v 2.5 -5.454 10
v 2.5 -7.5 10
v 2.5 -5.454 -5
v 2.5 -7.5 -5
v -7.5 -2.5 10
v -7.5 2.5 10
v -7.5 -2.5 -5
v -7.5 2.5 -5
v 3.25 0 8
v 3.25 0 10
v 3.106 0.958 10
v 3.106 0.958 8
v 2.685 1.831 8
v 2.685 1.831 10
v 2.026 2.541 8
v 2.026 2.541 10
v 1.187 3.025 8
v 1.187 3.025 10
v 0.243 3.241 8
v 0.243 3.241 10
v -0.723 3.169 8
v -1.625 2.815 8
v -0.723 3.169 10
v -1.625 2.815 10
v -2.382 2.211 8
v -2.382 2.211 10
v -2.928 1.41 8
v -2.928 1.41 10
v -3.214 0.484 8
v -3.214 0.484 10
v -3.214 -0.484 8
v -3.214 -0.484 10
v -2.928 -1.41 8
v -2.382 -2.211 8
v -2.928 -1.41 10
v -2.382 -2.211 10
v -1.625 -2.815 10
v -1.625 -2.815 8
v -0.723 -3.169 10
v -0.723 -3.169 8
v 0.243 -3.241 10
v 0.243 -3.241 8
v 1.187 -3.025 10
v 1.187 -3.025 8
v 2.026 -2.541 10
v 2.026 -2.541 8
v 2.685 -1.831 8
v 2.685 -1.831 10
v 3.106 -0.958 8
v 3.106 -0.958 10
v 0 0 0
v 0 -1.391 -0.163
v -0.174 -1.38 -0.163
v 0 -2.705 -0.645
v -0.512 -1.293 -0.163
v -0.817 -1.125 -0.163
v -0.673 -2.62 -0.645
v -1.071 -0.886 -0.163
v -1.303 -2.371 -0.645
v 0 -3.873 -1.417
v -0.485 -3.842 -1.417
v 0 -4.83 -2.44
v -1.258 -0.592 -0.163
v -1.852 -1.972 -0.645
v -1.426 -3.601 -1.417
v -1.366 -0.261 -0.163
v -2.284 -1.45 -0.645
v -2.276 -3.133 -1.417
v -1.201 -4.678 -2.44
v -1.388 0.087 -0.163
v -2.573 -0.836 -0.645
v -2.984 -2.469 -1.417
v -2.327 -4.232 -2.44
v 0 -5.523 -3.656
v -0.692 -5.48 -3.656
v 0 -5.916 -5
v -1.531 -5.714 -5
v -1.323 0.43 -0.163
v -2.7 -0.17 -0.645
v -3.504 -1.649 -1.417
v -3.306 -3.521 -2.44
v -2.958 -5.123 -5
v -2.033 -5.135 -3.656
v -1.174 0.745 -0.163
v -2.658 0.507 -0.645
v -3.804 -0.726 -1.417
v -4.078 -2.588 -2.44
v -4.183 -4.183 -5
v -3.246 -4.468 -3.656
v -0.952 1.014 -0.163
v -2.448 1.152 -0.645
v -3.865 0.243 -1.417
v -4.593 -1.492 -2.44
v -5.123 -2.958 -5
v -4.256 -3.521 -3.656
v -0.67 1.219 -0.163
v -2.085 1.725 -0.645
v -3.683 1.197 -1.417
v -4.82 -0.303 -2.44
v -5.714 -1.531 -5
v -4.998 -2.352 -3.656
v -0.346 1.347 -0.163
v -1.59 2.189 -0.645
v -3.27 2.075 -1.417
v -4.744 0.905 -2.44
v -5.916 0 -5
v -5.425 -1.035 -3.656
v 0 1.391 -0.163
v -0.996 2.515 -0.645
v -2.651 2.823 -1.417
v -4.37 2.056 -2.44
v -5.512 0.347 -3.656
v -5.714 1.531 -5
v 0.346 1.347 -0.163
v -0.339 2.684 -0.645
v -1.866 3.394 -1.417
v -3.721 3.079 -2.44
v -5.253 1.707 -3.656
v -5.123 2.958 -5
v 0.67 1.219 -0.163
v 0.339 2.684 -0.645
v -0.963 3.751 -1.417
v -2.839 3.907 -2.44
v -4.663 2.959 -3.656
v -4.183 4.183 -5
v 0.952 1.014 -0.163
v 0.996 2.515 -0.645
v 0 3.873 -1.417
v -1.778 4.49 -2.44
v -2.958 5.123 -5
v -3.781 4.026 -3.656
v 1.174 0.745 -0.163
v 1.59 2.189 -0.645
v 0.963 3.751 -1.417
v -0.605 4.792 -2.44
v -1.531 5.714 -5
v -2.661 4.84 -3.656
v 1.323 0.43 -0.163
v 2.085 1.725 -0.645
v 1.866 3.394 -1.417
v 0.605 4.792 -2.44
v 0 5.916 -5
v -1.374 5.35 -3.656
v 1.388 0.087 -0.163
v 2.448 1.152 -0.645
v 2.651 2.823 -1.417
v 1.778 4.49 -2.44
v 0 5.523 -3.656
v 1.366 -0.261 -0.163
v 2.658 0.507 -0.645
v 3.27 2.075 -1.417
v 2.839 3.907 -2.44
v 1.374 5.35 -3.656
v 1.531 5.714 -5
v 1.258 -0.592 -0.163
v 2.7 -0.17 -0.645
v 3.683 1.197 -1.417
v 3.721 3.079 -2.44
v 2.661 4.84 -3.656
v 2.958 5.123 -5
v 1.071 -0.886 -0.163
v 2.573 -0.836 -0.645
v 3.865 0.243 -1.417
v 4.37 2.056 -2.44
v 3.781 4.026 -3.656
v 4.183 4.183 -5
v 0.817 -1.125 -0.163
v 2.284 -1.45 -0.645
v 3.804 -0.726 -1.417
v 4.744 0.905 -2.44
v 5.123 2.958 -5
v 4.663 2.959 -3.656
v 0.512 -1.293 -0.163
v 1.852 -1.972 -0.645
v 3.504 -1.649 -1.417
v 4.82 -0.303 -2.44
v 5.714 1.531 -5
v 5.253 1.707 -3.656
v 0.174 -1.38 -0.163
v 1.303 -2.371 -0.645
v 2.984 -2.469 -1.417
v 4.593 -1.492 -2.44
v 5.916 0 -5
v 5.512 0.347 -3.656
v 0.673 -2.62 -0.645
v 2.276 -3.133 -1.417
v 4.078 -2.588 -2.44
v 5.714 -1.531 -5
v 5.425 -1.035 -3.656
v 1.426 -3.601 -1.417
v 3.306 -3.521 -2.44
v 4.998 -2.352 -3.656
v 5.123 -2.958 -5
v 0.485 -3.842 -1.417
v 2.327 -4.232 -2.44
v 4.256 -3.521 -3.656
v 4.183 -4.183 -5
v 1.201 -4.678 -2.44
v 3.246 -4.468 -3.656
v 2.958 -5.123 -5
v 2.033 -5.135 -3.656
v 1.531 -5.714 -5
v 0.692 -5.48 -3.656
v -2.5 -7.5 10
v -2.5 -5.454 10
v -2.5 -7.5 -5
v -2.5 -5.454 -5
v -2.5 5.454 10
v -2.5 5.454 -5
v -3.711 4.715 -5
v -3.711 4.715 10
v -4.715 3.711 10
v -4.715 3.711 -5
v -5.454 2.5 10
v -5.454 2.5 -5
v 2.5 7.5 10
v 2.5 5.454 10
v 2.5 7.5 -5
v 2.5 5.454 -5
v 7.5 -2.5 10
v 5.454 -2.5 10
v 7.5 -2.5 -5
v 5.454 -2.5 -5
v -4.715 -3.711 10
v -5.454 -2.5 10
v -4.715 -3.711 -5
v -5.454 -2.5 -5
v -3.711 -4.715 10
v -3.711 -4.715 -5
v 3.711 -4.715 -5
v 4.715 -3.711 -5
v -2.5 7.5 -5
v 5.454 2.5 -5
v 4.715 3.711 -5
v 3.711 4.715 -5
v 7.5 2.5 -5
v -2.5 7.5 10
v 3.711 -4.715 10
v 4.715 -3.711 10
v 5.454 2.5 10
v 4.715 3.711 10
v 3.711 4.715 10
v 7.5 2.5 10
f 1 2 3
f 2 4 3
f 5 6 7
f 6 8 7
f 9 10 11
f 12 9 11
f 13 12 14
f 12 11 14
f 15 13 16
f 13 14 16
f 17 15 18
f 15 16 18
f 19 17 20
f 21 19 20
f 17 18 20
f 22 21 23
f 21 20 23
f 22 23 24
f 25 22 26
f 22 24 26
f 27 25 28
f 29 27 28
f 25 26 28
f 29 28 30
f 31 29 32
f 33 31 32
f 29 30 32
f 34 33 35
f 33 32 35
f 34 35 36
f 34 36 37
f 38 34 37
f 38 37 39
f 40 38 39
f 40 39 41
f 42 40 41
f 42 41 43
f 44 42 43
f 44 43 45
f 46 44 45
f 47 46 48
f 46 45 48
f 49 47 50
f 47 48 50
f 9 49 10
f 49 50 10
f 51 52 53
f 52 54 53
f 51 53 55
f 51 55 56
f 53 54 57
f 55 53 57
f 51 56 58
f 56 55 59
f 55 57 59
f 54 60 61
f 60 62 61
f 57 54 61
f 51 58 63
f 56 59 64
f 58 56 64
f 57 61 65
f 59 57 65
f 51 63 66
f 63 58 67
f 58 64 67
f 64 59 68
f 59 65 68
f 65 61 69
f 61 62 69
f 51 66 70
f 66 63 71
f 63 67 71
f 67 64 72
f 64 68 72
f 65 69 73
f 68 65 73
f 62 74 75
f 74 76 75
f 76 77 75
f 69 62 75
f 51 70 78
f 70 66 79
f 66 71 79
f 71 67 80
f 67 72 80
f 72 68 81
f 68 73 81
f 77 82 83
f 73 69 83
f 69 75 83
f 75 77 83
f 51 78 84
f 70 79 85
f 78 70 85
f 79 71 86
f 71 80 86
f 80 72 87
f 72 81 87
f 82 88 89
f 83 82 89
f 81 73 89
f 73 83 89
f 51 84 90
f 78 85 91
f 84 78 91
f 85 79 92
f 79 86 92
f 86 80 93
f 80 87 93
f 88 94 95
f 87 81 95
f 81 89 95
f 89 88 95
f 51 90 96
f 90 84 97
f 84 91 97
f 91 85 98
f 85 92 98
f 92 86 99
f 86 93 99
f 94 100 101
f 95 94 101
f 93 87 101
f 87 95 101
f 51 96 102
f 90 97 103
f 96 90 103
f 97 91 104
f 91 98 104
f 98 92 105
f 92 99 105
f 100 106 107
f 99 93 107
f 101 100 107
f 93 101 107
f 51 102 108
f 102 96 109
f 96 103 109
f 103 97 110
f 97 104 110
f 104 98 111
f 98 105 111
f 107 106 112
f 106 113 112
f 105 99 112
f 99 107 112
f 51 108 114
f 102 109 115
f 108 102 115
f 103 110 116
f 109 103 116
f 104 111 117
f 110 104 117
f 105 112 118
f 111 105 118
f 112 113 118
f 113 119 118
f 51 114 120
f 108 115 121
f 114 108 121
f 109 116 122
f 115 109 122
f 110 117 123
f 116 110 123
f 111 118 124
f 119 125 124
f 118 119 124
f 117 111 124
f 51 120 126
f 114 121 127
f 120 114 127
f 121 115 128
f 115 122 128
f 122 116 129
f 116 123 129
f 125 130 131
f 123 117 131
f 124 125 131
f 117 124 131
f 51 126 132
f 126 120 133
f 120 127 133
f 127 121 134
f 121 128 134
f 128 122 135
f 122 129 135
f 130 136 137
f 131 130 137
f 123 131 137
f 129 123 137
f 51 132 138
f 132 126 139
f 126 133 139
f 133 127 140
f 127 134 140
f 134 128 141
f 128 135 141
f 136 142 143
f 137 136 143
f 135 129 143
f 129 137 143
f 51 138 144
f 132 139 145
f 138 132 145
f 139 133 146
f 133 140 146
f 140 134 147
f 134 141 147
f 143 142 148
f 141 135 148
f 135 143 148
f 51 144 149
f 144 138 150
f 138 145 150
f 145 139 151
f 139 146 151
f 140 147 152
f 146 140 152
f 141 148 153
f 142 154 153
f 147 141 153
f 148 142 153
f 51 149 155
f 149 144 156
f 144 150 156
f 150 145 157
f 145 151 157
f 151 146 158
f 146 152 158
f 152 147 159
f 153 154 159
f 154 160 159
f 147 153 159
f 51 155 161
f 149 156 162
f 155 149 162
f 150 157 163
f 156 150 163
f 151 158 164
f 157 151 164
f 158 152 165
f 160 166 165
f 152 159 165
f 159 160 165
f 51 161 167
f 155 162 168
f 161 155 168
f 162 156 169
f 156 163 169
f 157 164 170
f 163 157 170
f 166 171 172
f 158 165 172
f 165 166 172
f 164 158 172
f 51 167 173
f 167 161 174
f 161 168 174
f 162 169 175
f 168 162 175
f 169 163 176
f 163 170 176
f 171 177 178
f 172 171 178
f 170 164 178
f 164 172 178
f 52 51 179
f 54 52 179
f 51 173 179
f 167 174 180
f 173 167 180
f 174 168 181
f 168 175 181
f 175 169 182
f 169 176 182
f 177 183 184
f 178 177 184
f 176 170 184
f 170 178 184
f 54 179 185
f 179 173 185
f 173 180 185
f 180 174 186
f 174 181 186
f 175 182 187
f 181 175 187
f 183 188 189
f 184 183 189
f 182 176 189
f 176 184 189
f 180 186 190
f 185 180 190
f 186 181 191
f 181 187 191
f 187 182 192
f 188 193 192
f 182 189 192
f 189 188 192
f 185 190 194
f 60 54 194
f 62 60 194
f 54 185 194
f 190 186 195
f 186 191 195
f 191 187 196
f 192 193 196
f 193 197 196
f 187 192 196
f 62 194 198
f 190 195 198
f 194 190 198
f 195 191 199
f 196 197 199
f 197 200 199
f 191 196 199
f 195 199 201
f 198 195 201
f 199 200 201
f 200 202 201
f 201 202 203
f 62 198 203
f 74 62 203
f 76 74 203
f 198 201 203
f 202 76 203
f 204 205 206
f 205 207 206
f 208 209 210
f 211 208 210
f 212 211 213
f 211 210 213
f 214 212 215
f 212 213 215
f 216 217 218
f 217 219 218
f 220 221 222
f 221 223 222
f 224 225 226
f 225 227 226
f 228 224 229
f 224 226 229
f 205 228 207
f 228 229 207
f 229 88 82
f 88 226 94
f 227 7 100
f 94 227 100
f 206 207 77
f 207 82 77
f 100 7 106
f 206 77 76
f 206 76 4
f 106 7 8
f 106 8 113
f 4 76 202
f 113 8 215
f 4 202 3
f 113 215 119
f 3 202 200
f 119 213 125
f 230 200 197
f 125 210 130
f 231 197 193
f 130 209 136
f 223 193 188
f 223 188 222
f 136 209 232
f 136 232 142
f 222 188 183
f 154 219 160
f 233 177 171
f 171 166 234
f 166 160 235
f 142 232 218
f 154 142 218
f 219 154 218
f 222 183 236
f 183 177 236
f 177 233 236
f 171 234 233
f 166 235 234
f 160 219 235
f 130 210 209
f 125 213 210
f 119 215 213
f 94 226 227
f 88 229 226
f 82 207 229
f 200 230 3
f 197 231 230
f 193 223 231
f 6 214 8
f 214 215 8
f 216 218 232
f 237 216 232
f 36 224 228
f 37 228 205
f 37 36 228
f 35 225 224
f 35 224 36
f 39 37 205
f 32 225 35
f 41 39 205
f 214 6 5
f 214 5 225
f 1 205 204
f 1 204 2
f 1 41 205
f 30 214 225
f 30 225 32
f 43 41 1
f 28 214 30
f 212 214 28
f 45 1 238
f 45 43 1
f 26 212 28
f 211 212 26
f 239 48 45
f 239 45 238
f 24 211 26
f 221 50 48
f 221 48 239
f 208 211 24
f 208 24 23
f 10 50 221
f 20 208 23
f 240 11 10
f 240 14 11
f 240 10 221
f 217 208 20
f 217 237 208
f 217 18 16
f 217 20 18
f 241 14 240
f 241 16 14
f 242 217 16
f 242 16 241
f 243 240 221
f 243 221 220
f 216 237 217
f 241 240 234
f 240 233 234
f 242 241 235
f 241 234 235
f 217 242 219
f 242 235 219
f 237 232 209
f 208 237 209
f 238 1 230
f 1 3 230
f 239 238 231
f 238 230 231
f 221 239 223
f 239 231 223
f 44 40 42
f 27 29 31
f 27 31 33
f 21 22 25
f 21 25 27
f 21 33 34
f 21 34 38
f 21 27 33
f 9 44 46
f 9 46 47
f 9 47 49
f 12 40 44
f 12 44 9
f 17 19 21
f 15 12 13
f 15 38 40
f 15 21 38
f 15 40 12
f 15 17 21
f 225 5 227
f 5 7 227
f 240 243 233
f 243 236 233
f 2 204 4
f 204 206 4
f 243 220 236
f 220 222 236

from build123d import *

# Parameters (mm, degrees)
F0_W     = 5
F0_H     = 5
F1_DEPTH = 3
F5_DEPTH = 5
F7_DEPTH = 7
F8_R     = 3.25
F9_DEPTH = 2


with BuildPart() as f1:
    # F0 (on Top) → F1 (new body)
    with BuildSketch(Plane.XY):
        with BuildLine():
            Line((2.5, 2.5), (5.4543560573, 2.5))
            ThreePointArc((5.4543560573, 2.5), (4.2426406871, 4.2426406871), (2.5, 5.4543560573))
            Line((2.5, 5.4543560573), (2.5, 2.5))
        make_face()
        with BuildLine():
            Line((2.5, -7.5), (2.5, -5.4543560573))
            ThreePointArc((2.5, -5.4543560573), (0, -6), (-2.5, -5.4543560573))
            Line((-2.5, -5.4543560573), (-2.5, -7.5))
            Line((-2.5, -7.5), (2.5, -7.5))
        make_face()
        with BuildLine():
            ThreePointArc((-5.4543560573, -2.5), (-4.2426406871, -4.2426406871), (-2.5, -5.4543560573))
            Line((-2.5, -5.4543560573), (-2.5, -2.5))
            Line((-2.5, -2.5), (-5.4543560573, -2.5))
        make_face()
        with BuildLine():
            ThreePointArc((-5.4543560573, -2.5), (-6, 0), (-5.4543560573, 2.5))
            Line((-5.4543560573, 2.5), (-7.5, 2.5))
            Line((-7.5, 2.5), (-7.5, -2.5))
            Line((-7.5, -2.5), (-5.4543560573, -2.5))
        make_face()
        with BuildLine():
            ThreePointArc((2.5, -5.4543560573), (4.2426406871, -4.2426406871), (5.4543560573, -2.5))
            Line((5.4543560573, -2.5), (2.5, -2.5))
            Line((2.5, -2.5), (2.5, -5.4543560573))
        make_face()
        with BuildLine():
            Line((-2.5, 2.5), (-2.5, 5.4543560573))
            ThreePointArc((-2.5, 5.4543560573), (-4.2426406871, 4.2426406871), (-5.4543560573, 2.5))
            Line((-5.4543560573, 2.5), (-2.5, 2.5))
        make_face()
        with BuildLine():
            ThreePointArc((5.4543560573, -2.5), (5.8620020617, -1.2794263668), (6, 0))
            ThreePointArc((6, 0), (5.8620020617, 1.2794263668), (5.4543560573, 2.5))
            Line((5.4543560573, 2.5), (2.5, 2.5))
            Line((2.5, 2.5), (2.5, -2.5))
            Line((2.5, -2.5), (5.4543560573, -2.5))
        make_face()
        Rectangle(F0_W, F0_H)
        with BuildLine():
            Line((-2.5, -2.5), (-2.5, 2.5))
            Line((-2.5, 2.5), (-5.4543560573, 2.5))
            ThreePointArc((-5.4543560573, 2.5), (-6, 0), (-5.4543560573, -2.5))
            Line((-5.4543560573, -2.5), (-2.5, -2.5))
        make_face()
        with BuildLine():
            Line((2.5, 2.5), (2.5, 5.4543560573))
            ThreePointArc((2.5, 5.4543560573), (0, 6), (-2.5, 5.4543560573))
            Line((-2.5, 5.4543560573), (-2.5, 2.5))
            Line((-2.5, 2.5), (2.5, 2.5))
        make_face()
        with BuildLine():
            ThreePointArc((-2.5, 5.4543560573), (0, 6), (2.5, 5.4543560573))
            Line((2.5, 5.4543560573), (2.5, 7.5))
            Line((2.5, 7.5), (-2.5, 7.5))
            Line((-2.5, 7.5), (-2.5, 5.4543560573))
        make_face()
        with BuildLine():
            ThreePointArc((5.4543560573, 2.5), (5.8620020617, 1.2794263668), (6, 0))
            ThreePointArc((6, 0), (5.8620020617, -1.2794263668), (5.4543560573, -2.5))
            Line((5.4543560573, -2.5), (7.5, -2.5))
            Line((7.5, -2.5), (7.5, 2.5))
            Line((7.5, 2.5), (5.4543560573, 2.5))
        make_face()
        with BuildLine():
            ThreePointArc((-2.5, -5.4543560573), (0, -6), (2.5, -5.4543560573))
            Line((2.5, -5.4543560573), (2.5, -2.5))
            Line((2.5, -2.5), (-2.5, -2.5))
            Line((-2.5, -2.5), (-2.5, -5.4543560573))
        make_face()
    extrude(amount=F1_DEPTH)

    # F5 (add): a face of the model
    f5_faces = [f1.faces().sort_by_distance(p)[0] for p in [
        (0, 0, 0),
    ]]
    extrude(f5_faces, amount=F5_DEPTH)


with BuildPart() as f4:
    # F3 (on Right) → F4 (revolve)
    with BuildSketch(Plane.YZ):
        with BuildLine():
            Line((0, -12), (0, 0))
            ThreePointArc((0, 0), (-6, -6), (0, -12))
        make_face()
    revolve(axis=Axis((0, 0, -6), (0, 0, -1)))


with BuildPart() as f1_1:
    add(f1.part)

    # F6: cut F4
    add(f4.part, mode=Mode.SUBTRACT)

    # F2 (on face) → F7 (join)
    with BuildSketch(Plane.XY.offset(3)):
        with BuildLine():
            ThreePointArc((-2.5, 5.4543560573), (-4.2426406871, 4.2426406871), (-5.4543560573, 2.5))
            Line((-5.4543560573, 2.5), (-7.5, 2.5))
            Line((-7.5, 2.5), (-7.5, -2.5))
            Line((-7.5, -2.5), (-5.4543560573, -2.5))
            ThreePointArc((-5.4543560573, -2.5), (-4.2426406871, -4.2426406871), (-2.5, -5.4543560573))
            Line((-2.5, -5.4543560573), (-2.5, -7.5))
            Line((-2.5, -7.5), (2.5, -7.5))
            Line((2.5, -7.5), (2.5, -5.4543560573))
            ThreePointArc((2.5, -5.4543560573), (4.2426406871, -4.2426406871), (5.4543560573, -2.5))
            Line((5.4543560573, -2.5), (7.5, -2.5))
            Line((7.5, -2.5), (7.5, 2.5))
            Line((7.5, 2.5), (5.4543560573, 2.5))
            ThreePointArc((5.4543560573, 2.5), (4.2426406871, 4.2426406871), (2.5, 5.4543560573))
            Line((2.5, 5.4543560573), (2.5, 7.5))
            Line((2.5, 7.5), (-2.5, 7.5))
            Line((-2.5, 7.5), (-2.5, 5.4543560573))
        make_face()
    extrude(amount=F7_DEPTH)

    # F8 (on face) → F9 (cut)
    with BuildSketch(Plane.XY.offset(10)):
        Circle(F8_R)
    extrude(amount=-F9_DEPTH, mode=Mode.SUBTRACT)


solid = f1_1.part
